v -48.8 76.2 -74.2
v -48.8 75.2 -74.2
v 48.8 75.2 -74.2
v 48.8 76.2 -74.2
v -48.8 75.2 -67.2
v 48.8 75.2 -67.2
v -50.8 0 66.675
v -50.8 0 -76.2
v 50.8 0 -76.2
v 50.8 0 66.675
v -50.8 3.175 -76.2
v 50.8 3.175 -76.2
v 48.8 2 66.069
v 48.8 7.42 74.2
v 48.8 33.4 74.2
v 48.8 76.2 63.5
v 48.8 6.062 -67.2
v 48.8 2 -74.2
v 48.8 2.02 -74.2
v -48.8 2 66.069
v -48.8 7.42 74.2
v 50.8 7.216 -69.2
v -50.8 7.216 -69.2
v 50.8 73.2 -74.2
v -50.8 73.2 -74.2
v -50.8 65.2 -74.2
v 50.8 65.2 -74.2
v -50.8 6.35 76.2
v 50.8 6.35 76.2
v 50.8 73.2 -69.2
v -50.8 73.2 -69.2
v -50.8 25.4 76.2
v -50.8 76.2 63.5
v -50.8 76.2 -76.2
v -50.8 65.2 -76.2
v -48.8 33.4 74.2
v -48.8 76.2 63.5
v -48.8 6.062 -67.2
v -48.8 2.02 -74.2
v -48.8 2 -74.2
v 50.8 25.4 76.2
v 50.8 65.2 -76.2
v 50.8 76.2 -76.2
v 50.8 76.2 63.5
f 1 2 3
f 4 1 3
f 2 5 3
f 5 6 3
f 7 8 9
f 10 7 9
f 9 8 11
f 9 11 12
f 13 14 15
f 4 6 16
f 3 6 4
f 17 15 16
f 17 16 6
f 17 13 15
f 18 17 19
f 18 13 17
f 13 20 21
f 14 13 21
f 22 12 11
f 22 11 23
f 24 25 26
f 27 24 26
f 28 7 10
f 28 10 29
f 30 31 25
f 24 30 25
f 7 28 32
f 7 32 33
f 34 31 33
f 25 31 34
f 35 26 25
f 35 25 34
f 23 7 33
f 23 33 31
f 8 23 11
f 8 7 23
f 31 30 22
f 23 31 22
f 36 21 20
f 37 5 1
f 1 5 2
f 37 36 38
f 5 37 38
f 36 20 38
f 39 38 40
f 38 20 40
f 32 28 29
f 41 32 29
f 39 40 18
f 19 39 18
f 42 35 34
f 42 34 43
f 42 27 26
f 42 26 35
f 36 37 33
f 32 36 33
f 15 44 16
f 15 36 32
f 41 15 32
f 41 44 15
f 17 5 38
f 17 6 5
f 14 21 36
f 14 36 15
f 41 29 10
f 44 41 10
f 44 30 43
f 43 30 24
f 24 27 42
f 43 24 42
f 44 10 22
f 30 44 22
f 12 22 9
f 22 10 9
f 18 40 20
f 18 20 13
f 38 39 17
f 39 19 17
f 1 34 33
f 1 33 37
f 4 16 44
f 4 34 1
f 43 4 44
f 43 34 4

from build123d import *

# Parameters (mm, degrees)
SKETCH1_W           = 101.6
SKETCH1_H           = 152.4
BOSS_EXTRUDE1_DEPTH = 76.2
CUT_EXTRUDE1_DEPTH  = 102.6
CUT_EXTRUDE2_DEPTH  = 102.6
SHELL1_T            = -2


with BuildPart() as part:
    # Sketch1 → Boss-Extrude1 (new body)
    with BuildSketch(Plane(origin=(0, 0, 0), x_dir=(1, 0, 0), z_dir=(0, 1, 0))):
        Rectangle(SKETCH1_W, SKETCH1_H)
    extrude(amount=BOSS_EXTRUDE1_DEPTH)

    # Sketch2 → Cut-Extrude1 (cut, through all)
    with BuildSketch(Plane(origin=(50.8, 0, 0), x_dir=(0, 0, -1), z_dir=(1, 0, 0))):
        Polygon((-63.5, 76.2), (-76.2, 25.4), (-76.2, 76.2), align=None)
        Polygon((-76.2, 6.35), (-76.2, 0), (-66.675, 0), align=None)
    extrude(amount=-CUT_EXTRUDE1_DEPTH, mode=Mode.SUBTRACT)

    # Sketch3 → Cut-Extrude2 (cut, through all)
    with BuildSketch(Plane(origin=(50.8, 0, 0), x_dir=(0, 0, -1), z_dir=(1, 0, 0))):
        Polygon((69.2, 7.216451884), (69.2, 65.2), (69.2, 73.2), (74.2, 73.2), (74.2, 65.2), (76.2, 65.2), (76.2, 3.175), align=None)
    extrude(amount=-CUT_EXTRUDE2_DEPTH, mode=Mode.SUBTRACT)

    # Shell1
    shell1_openings = [part.faces().sort_by_distance(p)[0] for p in [
        (0, 76.2, -6.35),
        (0, 50.8, 69.85),
    ]]
    offset(amount=SHELL1_T, openings=shell1_openings, kind=Kind.INTERSECTION)


solid = part.part
